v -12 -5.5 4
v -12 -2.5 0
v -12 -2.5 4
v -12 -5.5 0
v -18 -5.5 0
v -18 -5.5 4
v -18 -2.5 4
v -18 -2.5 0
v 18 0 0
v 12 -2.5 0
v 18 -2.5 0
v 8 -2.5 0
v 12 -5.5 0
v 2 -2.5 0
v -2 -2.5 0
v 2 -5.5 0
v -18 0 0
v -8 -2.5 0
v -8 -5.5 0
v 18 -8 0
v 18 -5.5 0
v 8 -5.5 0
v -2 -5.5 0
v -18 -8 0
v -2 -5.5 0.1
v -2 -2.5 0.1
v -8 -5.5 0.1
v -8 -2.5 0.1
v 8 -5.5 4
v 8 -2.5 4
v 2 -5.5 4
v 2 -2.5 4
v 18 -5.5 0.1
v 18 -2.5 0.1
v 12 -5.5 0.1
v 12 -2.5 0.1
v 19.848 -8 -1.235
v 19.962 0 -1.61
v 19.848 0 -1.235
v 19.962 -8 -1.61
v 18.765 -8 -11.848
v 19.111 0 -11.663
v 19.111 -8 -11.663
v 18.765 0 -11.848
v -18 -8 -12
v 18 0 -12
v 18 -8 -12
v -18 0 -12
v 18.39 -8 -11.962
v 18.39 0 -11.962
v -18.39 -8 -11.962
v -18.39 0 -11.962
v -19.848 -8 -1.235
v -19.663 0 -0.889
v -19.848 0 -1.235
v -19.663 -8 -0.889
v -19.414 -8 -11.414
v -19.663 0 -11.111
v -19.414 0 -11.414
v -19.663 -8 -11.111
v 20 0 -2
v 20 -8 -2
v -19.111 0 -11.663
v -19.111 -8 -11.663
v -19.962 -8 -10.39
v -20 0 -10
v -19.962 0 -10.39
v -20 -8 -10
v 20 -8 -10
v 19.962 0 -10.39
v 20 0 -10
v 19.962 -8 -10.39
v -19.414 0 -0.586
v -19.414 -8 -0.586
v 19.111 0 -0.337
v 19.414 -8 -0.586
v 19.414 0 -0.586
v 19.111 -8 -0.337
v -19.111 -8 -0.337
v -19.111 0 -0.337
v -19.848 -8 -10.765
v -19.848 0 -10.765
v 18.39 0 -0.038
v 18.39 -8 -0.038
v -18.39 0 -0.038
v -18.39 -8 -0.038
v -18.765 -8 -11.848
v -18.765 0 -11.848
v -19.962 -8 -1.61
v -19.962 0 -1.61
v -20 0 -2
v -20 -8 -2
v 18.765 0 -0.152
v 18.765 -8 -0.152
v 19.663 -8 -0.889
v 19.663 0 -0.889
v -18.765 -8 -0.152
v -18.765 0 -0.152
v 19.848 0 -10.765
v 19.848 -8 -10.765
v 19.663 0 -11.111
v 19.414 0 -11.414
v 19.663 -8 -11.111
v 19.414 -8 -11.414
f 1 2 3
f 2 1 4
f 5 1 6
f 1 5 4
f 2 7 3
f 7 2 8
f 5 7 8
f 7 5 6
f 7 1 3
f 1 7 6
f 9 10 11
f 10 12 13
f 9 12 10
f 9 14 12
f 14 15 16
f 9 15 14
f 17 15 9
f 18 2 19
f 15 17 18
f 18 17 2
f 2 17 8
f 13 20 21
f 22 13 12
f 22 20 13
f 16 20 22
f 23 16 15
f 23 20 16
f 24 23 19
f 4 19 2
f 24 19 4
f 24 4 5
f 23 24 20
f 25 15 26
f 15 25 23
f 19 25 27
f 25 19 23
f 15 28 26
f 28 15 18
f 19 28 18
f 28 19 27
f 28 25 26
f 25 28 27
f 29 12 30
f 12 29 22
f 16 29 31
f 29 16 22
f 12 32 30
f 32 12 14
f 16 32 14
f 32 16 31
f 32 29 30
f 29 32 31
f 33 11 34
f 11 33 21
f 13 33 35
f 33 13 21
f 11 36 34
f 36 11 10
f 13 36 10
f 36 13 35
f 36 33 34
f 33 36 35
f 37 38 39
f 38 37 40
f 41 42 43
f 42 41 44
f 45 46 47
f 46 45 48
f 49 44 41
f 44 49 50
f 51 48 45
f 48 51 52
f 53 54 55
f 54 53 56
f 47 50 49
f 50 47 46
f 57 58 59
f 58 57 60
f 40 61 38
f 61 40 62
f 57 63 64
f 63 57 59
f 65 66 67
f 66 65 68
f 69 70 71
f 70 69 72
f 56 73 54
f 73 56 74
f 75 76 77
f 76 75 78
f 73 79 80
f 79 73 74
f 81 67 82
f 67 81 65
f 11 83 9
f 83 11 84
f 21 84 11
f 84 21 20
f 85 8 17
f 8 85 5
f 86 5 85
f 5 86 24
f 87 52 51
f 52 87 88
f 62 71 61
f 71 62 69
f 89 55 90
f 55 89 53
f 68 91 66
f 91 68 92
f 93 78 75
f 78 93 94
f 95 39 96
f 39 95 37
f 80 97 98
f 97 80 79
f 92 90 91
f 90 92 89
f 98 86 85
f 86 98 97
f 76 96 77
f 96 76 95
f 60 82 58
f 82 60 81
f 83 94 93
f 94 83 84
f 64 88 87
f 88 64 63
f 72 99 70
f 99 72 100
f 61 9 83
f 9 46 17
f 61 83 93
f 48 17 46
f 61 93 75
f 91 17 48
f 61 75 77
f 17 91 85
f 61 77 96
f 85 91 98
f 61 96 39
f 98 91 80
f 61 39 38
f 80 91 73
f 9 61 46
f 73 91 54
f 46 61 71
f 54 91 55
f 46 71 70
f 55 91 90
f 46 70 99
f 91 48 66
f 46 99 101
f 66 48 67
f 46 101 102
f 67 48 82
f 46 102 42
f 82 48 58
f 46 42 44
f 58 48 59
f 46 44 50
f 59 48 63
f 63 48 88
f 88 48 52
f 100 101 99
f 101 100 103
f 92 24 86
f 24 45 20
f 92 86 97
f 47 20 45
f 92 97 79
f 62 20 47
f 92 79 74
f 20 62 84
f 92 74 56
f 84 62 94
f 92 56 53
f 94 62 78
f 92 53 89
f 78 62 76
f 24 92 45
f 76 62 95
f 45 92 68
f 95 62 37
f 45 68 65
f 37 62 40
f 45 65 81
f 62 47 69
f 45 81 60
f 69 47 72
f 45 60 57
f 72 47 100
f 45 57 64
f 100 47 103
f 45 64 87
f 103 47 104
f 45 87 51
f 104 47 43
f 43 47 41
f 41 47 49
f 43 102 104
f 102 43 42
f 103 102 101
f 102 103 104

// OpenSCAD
// file: ../source/rm_common.scad
// RobotMind: solid, double-sided panels with one blind mounting interface
// and hermaphrodite battlement edges. All dimensions are millimetres.
$fn = 32;

RM_EPS = 0.1;
RM_UNIT = 40;
RM_GRID = 10;
RM_EDGE_MARGIN = RM_GRID/2;
RM_PANEL_T = 8;
RM_CORNER_R = 3;
RM_FIT = 0; // positive is looser; tune in 0.05 mm steps

// One hexagonal blind port. The hexagonal ring accepts a tool-free peg; the
// circular centre boss accepts an optional M3 screw without piercing the
// opposite face.
RM_PORT_OD = 8;
RM_PORT_BOSS_D = 5;
RM_PORT_DEPTH = 2.2;
RM_PORT_PILOT_D = 2.7;
RM_PORT_PILOT_DEPTH = 3;
RM_PEG_ENTRY = 0.2;
RM_PEG_GRIP = 0.2;
RM_PEG_INNER_CLEARANCE = 0.3;

RM_M3_CLEARANCE = 3.4;
RM_M3_HEAD_D = 6.2;
RM_M3_HEAD_DEPTH = 2;

// Hermaphrodite battlement edge. Every panel is identical and point
// symmetric: north and west edges lead with a tab, south and east with a
// socket, so any edge mates any neighbouring edge with no connector parts.
// Flips are always allowed; 90-degree in-plane twists are not.
RM_TAB_W = 6;     // feature width along the edge
RM_TAB_T = 3;     // feature thickness, centred in the panel
RM_TAB_PROUD = 4; // tab protrusion == socket depth

function rm_tab_w() = RM_TAB_W-2*RM_FIT;
function rm_socket_w() = RM_TAB_W+2*RM_FIT;
function rm_port_od() = RM_PORT_OD+2*RM_FIT;
function rm_port_boss_d() = RM_PORT_BOSS_D-2*RM_FIT;
function rm_pilot_d() = RM_PORT_PILOT_D+2*RM_FIT;
function rm_peg_root_od(delta=0) = RM_PORT_OD+RM_PEG_GRIP-2*RM_FIT+delta;
function rm_peg_tip_od(delta=0) = RM_PORT_OD-RM_PEG_ENTRY-2*RM_FIT+delta;
function rm_peg_id() = RM_PORT_BOSS_D+RM_PEG_INNER_CLEARANCE+2*RM_FIT;

function grid_count(span) = floor((span-2*RM_EDGE_MARGIN)/RM_GRID)+1;
function grid_position(i,span) = -span/2+RM_EDGE_MARGIN+i*RM_GRID;

assert(RM_UNIT%RM_GRID == 0, "The unit must contain a whole mounting grid");
assert(grid_count(RM_UNIT) == 4,
       "The 40 mm unit must expose a 4x4 port grid");
assert(RM_PANEL_T > 2*RM_PORT_PILOT_DEPTH,
       "Blind pilots need a continuous membrane");
assert(rm_peg_root_od() > rm_port_od() &&
       rm_port_od() > rm_peg_tip_od(),
       "RM_FIT is outside the hexagonal peg range");
assert(rm_peg_id() > rm_port_boss_d() &&
       rm_port_boss_d() > rm_pilot_d(),
       "The port boss must separate peg and screw fits");
assert(RM_GRID-RM_PORT_OD > 1,
       "Mounting ports need enough material between them");
assert(RM_PANEL_T-RM_TAB_T >= 4, "Battlements need 2 mm skins");
assert(RM_TAB_W < RM_GRID, "Battlements must clear each other and corners");

module rounded_box(size=[20,20,3], r=2) {
  linear_extrude(height=size[2])
    offset(r=r) offset(delta=-r) square([size[0],size[1]]);
}

module rounded_panel(size=[RM_UNIT,RM_UNIT], t=RM_PANEL_T,
                     r=RM_CORNER_R) {
  translate([-size[0]/2,-size[1]/2,0]) rounded_box([size[0],size[1],t],r);
}

// Cut from a face at Z=0 into material extending in +Z.
module blind_port_cut(depth=RM_PORT_DEPTH,
                      pilot_d=rm_pilot_d(),
                      pilot_depth=RM_PORT_PILOT_DEPTH) {
  union() {
    difference() {
      translate([0,0,-RM_EPS])
        cylinder(h=depth+RM_EPS,d=rm_port_od(),$fn=6);
      translate([0,0,-2*RM_EPS])
        cylinder(h=depth+3*RM_EPS,d=rm_port_boss_d());
    }
    translate([0,0,-RM_EPS])
      cylinder(h=pilot_depth+RM_EPS,d=pilot_d);
  }
}

module face_port_cuts(size=[RM_UNIT,RM_UNIT], top=false) {
  for(ix=[0:grid_count(size[0])-1], iy=[0:grid_count(size[1])-1]) {
    p=[grid_position(ix,size[0]),grid_position(iy,size[1])];
    if(top)
      translate([p[0],p[1],RM_PANEL_T]) mirror([0,0,1]) blind_port_cut();
    else
      translate([p[0],p[1],0]) blind_port_cut();
  }
}

module panel(size=[RM_UNIT,RM_UNIT]) {
  assert(size[0]%RM_UNIT == 0 && size[1]%RM_UNIT == 0,
         "Panel dimensions must be whole 40 mm units");
  hw=size[0]/2;
  hh=size[1]/2;
  difference() {
    union() {
      rounded_panel(size);
      edge_run_x(size[0], hh, 1, 0);   // north leads with a tab
      edge_run_x(size[0], -hh, -1, 1); // south leads with a socket
      edge_run_y(size[1], hw, 1, 1);   // east leads with a socket
      edge_run_y(size[1], -hw, -1, 0); // west leads with a tab
    }
    face_port_cuts(size);
    face_port_cuts(size,true);
  }
}

// Every carrier reuses this exact integral hexagonal peg.
module mount_peg(delta=0, h=RM_PORT_DEPTH) {
  difference() {
    cylinder(h=h,
             d1=rm_peg_root_od(delta),d2=rm_peg_tip_od(delta),$fn=6);
    translate([0,0,-RM_EPS])
      cylinder(h=h+2*RM_EPS,d=rm_peg_id());
  }
}

// Cut from an exposed surface at Z=0 into material extending in +Z.
module optional_screw_cut(depth=RM_PANEL_T) {
  translate([0,0,-RM_EPS])
    cylinder(h=depth+2*RM_EPS,d=RM_M3_CLEARANCE);
  translate([0,0,-RM_EPS])
    cylinder(h=RM_M3_HEAD_DEPTH+RM_EPS,d=RM_M3_HEAD_D);
}

// Battlement primitives. phase 0 puts tabs on even grid indices, phase 1 on
// odd indices. Edges running along X sit at y=y0 and open toward sy; edges
// along Y sit at x=x0 and open toward sx.
module _tab(x, y0, sy) {
  translate([x-RM_TAB_W/2,
             sy>0 ? y0 : y0-RM_TAB_PROUD,
             (RM_PANEL_T-RM_TAB_T)/2])
    cube([RM_TAB_W,RM_TAB_PROUD,RM_TAB_T]);
}

module _socket(x, y0, sy) {
  translate([x-rm_socket_w()/2,
             sy>0 ? y0-RM_TAB_PROUD-RM_EPS : y0-RM_EPS,
             (RM_PANEL_T-RM_TAB_T)/2])
    cube([rm_socket_w(),RM_TAB_PROUD+2*RM_EPS,RM_TAB_T]);
}

module edge_run_x(length, y0, sy, phase) {
  for(i=[0:grid_count(length)-1])
    if(i%2 == phase)
      _tab(grid_position(i,length),y0,sy);
    else
      _socket(grid_position(i,length),y0,sy);
}

module edge_run_y(length, x0, sx, phase) {
  for(i=[0:grid_count(length)-1])
    if(i%2 == phase)
      translate([sx>0 ? x0 : x0-RM_TAB_PROUD,
                 grid_position(i,length)-RM_TAB_W/2,
                 (RM_PANEL_T-RM_TAB_T)/2])
        cube([RM_TAB_PROUD,RM_TAB_W,RM_TAB_T]);
    else
      translate([sx>0 ? x0-RM_TAB_PROUD-RM_EPS : x0-RM_EPS,
                 grid_position(i,length)-rm_socket_w()/2,
                 (RM_PANEL_T-RM_TAB_T)/2])
        cube([RM_TAB_PROUD+2*RM_EPS,rm_socket_w(),RM_TAB_T]);
}
// main file
include <../source/rm_common.scad>

// One 1 U battlement edge on a handle strip. Print two: they mate flush
// with one coupon flipped over, in both tab-first directions. Prints lying
// on a long side face, features upward, support-free.

module edge_coupon() {
  union() {
    translate([-20,-12,0]) rounded_box([40,12,RM_PANEL_T],2);
    edge_run_x(RM_UNIT, 0, 1, 0);
  }
}

rotate([90,0,0]) edge_coupon();
